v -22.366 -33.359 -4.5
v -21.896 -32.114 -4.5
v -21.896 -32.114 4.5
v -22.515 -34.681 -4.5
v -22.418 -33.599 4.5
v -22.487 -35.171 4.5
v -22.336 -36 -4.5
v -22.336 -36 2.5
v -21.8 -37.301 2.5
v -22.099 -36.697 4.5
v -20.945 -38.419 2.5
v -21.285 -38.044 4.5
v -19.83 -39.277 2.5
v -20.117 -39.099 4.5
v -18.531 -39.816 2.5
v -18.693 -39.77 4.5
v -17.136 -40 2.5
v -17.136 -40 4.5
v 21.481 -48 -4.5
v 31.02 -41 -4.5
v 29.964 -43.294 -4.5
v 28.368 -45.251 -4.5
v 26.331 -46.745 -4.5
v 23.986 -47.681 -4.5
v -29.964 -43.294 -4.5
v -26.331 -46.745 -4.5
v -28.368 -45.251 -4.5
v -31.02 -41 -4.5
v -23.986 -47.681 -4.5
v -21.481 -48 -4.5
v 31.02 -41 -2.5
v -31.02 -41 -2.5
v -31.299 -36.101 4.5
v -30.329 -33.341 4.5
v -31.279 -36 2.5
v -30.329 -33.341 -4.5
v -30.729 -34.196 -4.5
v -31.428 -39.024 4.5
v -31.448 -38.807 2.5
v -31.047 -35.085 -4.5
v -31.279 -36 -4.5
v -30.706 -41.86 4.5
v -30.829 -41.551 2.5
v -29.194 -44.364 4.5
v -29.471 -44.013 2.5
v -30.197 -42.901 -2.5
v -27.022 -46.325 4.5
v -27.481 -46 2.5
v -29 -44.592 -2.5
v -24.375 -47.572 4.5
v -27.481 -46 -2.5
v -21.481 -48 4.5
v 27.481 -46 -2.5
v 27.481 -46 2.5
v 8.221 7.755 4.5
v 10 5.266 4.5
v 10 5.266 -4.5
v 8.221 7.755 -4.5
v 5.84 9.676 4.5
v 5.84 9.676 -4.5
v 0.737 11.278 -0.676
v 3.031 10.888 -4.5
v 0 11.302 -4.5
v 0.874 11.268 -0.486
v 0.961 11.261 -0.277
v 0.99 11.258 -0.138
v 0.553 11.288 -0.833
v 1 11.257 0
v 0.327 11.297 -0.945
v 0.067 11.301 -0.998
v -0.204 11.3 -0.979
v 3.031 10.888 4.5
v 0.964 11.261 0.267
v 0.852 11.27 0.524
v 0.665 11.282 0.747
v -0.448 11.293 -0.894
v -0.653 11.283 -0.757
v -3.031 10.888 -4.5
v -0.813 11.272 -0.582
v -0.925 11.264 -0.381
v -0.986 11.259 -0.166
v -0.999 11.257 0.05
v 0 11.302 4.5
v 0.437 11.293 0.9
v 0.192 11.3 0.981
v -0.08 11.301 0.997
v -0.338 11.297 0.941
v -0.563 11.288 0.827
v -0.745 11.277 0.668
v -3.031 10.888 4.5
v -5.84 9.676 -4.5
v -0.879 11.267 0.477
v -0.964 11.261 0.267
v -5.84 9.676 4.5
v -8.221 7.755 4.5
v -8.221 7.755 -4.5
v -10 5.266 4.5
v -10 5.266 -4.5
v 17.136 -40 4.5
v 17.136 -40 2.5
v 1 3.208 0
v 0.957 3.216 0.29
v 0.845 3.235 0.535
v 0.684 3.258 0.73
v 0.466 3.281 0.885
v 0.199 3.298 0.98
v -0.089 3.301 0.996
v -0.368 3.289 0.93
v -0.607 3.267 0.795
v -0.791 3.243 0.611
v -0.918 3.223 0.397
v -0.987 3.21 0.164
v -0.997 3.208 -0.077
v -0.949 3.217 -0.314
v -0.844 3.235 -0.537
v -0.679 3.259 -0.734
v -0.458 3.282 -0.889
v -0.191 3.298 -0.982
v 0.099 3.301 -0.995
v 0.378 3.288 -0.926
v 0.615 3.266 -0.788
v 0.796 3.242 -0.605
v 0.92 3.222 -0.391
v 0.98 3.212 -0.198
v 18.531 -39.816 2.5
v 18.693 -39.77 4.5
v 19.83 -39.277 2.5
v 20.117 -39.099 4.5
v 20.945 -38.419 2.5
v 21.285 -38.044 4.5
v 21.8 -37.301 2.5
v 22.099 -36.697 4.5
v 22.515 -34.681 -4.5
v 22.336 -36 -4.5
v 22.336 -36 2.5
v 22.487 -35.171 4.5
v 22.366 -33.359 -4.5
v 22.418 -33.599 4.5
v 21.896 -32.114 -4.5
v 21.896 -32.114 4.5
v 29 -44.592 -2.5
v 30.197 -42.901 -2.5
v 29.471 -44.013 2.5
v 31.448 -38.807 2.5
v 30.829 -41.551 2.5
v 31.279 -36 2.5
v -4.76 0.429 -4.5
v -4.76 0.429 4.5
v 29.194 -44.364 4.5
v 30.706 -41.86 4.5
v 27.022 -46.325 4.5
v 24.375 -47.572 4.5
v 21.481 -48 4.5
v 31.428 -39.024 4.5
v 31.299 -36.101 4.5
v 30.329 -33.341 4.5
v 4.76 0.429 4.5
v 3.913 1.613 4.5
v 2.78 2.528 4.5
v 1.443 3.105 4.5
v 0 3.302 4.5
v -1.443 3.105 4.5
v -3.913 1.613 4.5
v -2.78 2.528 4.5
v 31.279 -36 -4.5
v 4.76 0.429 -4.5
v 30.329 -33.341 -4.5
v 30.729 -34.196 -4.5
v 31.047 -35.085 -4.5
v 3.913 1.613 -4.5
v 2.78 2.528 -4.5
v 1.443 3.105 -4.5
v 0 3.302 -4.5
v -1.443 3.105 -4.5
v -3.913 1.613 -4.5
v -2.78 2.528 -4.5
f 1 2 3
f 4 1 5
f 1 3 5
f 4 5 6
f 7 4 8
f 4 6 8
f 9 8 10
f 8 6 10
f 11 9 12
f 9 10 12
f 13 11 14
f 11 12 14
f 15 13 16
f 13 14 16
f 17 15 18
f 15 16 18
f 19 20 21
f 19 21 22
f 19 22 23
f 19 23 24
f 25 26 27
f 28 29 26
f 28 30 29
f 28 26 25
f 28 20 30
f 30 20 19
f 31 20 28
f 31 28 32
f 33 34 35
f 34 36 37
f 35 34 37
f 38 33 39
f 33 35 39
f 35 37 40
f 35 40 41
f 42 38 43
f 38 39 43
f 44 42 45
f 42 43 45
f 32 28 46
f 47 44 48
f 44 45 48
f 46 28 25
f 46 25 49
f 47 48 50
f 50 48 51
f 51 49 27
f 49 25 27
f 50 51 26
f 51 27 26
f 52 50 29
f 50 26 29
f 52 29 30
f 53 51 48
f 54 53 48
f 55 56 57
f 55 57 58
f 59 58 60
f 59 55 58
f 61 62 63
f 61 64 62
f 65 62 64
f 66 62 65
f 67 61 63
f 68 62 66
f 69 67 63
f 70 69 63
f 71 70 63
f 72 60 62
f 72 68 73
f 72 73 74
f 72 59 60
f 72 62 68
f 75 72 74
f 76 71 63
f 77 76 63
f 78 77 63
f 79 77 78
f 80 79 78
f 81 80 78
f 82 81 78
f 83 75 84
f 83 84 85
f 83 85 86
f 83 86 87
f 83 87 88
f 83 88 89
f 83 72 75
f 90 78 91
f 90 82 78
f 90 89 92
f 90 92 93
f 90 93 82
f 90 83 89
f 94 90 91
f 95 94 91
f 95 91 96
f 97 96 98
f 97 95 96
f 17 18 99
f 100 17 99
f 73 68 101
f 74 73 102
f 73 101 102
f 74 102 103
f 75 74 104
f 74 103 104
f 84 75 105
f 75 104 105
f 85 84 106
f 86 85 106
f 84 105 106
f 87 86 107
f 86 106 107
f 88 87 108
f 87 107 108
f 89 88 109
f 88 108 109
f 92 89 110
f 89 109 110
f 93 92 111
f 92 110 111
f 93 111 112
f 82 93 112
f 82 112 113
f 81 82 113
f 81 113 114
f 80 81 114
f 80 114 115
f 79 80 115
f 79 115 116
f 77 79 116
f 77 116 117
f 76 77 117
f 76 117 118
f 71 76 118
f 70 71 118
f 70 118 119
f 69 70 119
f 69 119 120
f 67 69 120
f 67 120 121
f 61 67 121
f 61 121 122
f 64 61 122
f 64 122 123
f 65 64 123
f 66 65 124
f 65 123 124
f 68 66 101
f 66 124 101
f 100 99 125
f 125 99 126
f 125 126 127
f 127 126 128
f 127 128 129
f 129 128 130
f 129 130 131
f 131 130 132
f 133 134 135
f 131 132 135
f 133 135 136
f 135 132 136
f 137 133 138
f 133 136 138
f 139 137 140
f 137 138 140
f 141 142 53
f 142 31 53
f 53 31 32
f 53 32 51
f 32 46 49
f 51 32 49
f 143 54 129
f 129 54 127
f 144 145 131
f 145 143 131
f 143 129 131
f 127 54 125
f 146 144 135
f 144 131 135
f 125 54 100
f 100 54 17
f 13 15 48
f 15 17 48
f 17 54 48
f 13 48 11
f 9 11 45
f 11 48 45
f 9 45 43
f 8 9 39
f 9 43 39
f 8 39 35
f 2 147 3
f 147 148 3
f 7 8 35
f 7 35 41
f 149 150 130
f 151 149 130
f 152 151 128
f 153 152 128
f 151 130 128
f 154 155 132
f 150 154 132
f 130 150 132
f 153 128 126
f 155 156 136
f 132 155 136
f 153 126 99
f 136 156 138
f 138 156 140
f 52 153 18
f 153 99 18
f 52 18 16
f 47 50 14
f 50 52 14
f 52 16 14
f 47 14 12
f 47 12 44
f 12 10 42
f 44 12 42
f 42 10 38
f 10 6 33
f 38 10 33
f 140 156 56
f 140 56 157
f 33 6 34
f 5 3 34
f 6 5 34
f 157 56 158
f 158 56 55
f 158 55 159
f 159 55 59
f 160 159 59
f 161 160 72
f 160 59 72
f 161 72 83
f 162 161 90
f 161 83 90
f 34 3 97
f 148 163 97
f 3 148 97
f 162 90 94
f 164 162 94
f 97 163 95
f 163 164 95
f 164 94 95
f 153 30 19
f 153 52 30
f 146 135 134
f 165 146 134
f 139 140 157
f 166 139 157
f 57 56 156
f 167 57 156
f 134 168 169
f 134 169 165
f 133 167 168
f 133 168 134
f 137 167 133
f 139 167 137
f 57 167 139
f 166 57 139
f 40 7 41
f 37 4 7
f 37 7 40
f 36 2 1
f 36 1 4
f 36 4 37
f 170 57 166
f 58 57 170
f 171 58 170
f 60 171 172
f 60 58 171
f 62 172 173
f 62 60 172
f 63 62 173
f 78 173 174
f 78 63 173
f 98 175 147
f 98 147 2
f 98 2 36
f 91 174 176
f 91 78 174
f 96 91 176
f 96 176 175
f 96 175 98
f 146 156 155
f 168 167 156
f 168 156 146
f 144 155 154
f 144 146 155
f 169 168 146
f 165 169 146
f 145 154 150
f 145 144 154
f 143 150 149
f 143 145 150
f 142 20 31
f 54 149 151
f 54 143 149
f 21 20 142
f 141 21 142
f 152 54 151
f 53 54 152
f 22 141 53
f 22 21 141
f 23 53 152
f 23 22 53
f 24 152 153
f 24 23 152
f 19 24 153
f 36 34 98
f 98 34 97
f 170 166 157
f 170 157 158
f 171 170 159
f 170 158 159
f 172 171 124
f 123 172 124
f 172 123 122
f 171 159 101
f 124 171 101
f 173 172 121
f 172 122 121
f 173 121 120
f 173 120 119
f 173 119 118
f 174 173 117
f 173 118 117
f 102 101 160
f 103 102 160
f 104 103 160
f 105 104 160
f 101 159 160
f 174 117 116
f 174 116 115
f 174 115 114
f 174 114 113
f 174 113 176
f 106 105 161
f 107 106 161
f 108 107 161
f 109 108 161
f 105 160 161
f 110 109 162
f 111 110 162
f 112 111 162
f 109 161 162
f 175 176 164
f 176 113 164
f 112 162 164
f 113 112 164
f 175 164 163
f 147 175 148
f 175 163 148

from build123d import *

# Parameters (mm, degrees)
PAD_DEPTH            = 4.5
SKETCH001_R          = 1
POCKET_DEPTH         = 11.302669
POCKET001_DEPTH      = 38.049191
POCKET001_DEPTH_BACK = -38.049191
FILLET_R             = 10


with BuildPart() as part:
    # Sketch → Pad (new body, symmetric)
    with BuildSketch(Plane.XY):
        with BuildLine():
            Line((10, 5.265712), (38.048191, -48))
            Line((-38.048191, -48), (38.048191, -48))
            Line((-38.048191, -48), (-10, 5.265712))
            ThreePointArc((10, 5.265712), (0, 11.301669), (-10, 5.265712))
        make_face()
        with BuildLine():
            Line((-4.76, 0.428554), (-21.895934, -32.113926))
            ThreePointArc((-21.895934, -32.113926), (-21.741576, -37.400351), (-17.135934, -40))
            Line((-17.135934, -40), (17.135934, -40))
            ThreePointArc((17.135934, -40), (21.741576, -37.400351), (21.895934, -32.113926))
            Line((21.895934, -32.113926), (4.76, 0.428554))
            ThreePointArc((4.76, 0.428554), (0, 3.301669), (-4.76, 0.428554))
        make_face(mode=Mode.SUBTRACT)
    extrude(amount=PAD_DEPTH, both=True)

    # Sketch001 → Pocket (cut, through all)
    with BuildSketch(Plane.XZ):
        Circle(SKETCH001_R)
    extrude(amount=-POCKET_DEPTH, mode=Mode.SUBTRACT)

    # Sketch002 → Pocket001 (cut, two sides)
    with BuildSketch(Plane.YZ) as pocket001_sk:
        Polygon((-41, -5.5), (-41, -2.5), (-46, -2.5), (-46, 2.5), (-36, 2.5), (-36, -5.5), align=None)
    extrude(amount=-POCKET001_DEPTH, mode=Mode.SUBTRACT)
    extrude(pocket001_sk.sketch, amount=-POCKET001_DEPTH_BACK, mode=Mode.SUBTRACT)

    # Fillet
    fillet_edges = [part.edges().sort_by_distance(p)[0] for p in [
        (38.048191, -48, 0),
        (-38.048191, -48, 0),
    ]]
    fillet(fillet_edges, radius=FILLET_R)


solid = part.part
